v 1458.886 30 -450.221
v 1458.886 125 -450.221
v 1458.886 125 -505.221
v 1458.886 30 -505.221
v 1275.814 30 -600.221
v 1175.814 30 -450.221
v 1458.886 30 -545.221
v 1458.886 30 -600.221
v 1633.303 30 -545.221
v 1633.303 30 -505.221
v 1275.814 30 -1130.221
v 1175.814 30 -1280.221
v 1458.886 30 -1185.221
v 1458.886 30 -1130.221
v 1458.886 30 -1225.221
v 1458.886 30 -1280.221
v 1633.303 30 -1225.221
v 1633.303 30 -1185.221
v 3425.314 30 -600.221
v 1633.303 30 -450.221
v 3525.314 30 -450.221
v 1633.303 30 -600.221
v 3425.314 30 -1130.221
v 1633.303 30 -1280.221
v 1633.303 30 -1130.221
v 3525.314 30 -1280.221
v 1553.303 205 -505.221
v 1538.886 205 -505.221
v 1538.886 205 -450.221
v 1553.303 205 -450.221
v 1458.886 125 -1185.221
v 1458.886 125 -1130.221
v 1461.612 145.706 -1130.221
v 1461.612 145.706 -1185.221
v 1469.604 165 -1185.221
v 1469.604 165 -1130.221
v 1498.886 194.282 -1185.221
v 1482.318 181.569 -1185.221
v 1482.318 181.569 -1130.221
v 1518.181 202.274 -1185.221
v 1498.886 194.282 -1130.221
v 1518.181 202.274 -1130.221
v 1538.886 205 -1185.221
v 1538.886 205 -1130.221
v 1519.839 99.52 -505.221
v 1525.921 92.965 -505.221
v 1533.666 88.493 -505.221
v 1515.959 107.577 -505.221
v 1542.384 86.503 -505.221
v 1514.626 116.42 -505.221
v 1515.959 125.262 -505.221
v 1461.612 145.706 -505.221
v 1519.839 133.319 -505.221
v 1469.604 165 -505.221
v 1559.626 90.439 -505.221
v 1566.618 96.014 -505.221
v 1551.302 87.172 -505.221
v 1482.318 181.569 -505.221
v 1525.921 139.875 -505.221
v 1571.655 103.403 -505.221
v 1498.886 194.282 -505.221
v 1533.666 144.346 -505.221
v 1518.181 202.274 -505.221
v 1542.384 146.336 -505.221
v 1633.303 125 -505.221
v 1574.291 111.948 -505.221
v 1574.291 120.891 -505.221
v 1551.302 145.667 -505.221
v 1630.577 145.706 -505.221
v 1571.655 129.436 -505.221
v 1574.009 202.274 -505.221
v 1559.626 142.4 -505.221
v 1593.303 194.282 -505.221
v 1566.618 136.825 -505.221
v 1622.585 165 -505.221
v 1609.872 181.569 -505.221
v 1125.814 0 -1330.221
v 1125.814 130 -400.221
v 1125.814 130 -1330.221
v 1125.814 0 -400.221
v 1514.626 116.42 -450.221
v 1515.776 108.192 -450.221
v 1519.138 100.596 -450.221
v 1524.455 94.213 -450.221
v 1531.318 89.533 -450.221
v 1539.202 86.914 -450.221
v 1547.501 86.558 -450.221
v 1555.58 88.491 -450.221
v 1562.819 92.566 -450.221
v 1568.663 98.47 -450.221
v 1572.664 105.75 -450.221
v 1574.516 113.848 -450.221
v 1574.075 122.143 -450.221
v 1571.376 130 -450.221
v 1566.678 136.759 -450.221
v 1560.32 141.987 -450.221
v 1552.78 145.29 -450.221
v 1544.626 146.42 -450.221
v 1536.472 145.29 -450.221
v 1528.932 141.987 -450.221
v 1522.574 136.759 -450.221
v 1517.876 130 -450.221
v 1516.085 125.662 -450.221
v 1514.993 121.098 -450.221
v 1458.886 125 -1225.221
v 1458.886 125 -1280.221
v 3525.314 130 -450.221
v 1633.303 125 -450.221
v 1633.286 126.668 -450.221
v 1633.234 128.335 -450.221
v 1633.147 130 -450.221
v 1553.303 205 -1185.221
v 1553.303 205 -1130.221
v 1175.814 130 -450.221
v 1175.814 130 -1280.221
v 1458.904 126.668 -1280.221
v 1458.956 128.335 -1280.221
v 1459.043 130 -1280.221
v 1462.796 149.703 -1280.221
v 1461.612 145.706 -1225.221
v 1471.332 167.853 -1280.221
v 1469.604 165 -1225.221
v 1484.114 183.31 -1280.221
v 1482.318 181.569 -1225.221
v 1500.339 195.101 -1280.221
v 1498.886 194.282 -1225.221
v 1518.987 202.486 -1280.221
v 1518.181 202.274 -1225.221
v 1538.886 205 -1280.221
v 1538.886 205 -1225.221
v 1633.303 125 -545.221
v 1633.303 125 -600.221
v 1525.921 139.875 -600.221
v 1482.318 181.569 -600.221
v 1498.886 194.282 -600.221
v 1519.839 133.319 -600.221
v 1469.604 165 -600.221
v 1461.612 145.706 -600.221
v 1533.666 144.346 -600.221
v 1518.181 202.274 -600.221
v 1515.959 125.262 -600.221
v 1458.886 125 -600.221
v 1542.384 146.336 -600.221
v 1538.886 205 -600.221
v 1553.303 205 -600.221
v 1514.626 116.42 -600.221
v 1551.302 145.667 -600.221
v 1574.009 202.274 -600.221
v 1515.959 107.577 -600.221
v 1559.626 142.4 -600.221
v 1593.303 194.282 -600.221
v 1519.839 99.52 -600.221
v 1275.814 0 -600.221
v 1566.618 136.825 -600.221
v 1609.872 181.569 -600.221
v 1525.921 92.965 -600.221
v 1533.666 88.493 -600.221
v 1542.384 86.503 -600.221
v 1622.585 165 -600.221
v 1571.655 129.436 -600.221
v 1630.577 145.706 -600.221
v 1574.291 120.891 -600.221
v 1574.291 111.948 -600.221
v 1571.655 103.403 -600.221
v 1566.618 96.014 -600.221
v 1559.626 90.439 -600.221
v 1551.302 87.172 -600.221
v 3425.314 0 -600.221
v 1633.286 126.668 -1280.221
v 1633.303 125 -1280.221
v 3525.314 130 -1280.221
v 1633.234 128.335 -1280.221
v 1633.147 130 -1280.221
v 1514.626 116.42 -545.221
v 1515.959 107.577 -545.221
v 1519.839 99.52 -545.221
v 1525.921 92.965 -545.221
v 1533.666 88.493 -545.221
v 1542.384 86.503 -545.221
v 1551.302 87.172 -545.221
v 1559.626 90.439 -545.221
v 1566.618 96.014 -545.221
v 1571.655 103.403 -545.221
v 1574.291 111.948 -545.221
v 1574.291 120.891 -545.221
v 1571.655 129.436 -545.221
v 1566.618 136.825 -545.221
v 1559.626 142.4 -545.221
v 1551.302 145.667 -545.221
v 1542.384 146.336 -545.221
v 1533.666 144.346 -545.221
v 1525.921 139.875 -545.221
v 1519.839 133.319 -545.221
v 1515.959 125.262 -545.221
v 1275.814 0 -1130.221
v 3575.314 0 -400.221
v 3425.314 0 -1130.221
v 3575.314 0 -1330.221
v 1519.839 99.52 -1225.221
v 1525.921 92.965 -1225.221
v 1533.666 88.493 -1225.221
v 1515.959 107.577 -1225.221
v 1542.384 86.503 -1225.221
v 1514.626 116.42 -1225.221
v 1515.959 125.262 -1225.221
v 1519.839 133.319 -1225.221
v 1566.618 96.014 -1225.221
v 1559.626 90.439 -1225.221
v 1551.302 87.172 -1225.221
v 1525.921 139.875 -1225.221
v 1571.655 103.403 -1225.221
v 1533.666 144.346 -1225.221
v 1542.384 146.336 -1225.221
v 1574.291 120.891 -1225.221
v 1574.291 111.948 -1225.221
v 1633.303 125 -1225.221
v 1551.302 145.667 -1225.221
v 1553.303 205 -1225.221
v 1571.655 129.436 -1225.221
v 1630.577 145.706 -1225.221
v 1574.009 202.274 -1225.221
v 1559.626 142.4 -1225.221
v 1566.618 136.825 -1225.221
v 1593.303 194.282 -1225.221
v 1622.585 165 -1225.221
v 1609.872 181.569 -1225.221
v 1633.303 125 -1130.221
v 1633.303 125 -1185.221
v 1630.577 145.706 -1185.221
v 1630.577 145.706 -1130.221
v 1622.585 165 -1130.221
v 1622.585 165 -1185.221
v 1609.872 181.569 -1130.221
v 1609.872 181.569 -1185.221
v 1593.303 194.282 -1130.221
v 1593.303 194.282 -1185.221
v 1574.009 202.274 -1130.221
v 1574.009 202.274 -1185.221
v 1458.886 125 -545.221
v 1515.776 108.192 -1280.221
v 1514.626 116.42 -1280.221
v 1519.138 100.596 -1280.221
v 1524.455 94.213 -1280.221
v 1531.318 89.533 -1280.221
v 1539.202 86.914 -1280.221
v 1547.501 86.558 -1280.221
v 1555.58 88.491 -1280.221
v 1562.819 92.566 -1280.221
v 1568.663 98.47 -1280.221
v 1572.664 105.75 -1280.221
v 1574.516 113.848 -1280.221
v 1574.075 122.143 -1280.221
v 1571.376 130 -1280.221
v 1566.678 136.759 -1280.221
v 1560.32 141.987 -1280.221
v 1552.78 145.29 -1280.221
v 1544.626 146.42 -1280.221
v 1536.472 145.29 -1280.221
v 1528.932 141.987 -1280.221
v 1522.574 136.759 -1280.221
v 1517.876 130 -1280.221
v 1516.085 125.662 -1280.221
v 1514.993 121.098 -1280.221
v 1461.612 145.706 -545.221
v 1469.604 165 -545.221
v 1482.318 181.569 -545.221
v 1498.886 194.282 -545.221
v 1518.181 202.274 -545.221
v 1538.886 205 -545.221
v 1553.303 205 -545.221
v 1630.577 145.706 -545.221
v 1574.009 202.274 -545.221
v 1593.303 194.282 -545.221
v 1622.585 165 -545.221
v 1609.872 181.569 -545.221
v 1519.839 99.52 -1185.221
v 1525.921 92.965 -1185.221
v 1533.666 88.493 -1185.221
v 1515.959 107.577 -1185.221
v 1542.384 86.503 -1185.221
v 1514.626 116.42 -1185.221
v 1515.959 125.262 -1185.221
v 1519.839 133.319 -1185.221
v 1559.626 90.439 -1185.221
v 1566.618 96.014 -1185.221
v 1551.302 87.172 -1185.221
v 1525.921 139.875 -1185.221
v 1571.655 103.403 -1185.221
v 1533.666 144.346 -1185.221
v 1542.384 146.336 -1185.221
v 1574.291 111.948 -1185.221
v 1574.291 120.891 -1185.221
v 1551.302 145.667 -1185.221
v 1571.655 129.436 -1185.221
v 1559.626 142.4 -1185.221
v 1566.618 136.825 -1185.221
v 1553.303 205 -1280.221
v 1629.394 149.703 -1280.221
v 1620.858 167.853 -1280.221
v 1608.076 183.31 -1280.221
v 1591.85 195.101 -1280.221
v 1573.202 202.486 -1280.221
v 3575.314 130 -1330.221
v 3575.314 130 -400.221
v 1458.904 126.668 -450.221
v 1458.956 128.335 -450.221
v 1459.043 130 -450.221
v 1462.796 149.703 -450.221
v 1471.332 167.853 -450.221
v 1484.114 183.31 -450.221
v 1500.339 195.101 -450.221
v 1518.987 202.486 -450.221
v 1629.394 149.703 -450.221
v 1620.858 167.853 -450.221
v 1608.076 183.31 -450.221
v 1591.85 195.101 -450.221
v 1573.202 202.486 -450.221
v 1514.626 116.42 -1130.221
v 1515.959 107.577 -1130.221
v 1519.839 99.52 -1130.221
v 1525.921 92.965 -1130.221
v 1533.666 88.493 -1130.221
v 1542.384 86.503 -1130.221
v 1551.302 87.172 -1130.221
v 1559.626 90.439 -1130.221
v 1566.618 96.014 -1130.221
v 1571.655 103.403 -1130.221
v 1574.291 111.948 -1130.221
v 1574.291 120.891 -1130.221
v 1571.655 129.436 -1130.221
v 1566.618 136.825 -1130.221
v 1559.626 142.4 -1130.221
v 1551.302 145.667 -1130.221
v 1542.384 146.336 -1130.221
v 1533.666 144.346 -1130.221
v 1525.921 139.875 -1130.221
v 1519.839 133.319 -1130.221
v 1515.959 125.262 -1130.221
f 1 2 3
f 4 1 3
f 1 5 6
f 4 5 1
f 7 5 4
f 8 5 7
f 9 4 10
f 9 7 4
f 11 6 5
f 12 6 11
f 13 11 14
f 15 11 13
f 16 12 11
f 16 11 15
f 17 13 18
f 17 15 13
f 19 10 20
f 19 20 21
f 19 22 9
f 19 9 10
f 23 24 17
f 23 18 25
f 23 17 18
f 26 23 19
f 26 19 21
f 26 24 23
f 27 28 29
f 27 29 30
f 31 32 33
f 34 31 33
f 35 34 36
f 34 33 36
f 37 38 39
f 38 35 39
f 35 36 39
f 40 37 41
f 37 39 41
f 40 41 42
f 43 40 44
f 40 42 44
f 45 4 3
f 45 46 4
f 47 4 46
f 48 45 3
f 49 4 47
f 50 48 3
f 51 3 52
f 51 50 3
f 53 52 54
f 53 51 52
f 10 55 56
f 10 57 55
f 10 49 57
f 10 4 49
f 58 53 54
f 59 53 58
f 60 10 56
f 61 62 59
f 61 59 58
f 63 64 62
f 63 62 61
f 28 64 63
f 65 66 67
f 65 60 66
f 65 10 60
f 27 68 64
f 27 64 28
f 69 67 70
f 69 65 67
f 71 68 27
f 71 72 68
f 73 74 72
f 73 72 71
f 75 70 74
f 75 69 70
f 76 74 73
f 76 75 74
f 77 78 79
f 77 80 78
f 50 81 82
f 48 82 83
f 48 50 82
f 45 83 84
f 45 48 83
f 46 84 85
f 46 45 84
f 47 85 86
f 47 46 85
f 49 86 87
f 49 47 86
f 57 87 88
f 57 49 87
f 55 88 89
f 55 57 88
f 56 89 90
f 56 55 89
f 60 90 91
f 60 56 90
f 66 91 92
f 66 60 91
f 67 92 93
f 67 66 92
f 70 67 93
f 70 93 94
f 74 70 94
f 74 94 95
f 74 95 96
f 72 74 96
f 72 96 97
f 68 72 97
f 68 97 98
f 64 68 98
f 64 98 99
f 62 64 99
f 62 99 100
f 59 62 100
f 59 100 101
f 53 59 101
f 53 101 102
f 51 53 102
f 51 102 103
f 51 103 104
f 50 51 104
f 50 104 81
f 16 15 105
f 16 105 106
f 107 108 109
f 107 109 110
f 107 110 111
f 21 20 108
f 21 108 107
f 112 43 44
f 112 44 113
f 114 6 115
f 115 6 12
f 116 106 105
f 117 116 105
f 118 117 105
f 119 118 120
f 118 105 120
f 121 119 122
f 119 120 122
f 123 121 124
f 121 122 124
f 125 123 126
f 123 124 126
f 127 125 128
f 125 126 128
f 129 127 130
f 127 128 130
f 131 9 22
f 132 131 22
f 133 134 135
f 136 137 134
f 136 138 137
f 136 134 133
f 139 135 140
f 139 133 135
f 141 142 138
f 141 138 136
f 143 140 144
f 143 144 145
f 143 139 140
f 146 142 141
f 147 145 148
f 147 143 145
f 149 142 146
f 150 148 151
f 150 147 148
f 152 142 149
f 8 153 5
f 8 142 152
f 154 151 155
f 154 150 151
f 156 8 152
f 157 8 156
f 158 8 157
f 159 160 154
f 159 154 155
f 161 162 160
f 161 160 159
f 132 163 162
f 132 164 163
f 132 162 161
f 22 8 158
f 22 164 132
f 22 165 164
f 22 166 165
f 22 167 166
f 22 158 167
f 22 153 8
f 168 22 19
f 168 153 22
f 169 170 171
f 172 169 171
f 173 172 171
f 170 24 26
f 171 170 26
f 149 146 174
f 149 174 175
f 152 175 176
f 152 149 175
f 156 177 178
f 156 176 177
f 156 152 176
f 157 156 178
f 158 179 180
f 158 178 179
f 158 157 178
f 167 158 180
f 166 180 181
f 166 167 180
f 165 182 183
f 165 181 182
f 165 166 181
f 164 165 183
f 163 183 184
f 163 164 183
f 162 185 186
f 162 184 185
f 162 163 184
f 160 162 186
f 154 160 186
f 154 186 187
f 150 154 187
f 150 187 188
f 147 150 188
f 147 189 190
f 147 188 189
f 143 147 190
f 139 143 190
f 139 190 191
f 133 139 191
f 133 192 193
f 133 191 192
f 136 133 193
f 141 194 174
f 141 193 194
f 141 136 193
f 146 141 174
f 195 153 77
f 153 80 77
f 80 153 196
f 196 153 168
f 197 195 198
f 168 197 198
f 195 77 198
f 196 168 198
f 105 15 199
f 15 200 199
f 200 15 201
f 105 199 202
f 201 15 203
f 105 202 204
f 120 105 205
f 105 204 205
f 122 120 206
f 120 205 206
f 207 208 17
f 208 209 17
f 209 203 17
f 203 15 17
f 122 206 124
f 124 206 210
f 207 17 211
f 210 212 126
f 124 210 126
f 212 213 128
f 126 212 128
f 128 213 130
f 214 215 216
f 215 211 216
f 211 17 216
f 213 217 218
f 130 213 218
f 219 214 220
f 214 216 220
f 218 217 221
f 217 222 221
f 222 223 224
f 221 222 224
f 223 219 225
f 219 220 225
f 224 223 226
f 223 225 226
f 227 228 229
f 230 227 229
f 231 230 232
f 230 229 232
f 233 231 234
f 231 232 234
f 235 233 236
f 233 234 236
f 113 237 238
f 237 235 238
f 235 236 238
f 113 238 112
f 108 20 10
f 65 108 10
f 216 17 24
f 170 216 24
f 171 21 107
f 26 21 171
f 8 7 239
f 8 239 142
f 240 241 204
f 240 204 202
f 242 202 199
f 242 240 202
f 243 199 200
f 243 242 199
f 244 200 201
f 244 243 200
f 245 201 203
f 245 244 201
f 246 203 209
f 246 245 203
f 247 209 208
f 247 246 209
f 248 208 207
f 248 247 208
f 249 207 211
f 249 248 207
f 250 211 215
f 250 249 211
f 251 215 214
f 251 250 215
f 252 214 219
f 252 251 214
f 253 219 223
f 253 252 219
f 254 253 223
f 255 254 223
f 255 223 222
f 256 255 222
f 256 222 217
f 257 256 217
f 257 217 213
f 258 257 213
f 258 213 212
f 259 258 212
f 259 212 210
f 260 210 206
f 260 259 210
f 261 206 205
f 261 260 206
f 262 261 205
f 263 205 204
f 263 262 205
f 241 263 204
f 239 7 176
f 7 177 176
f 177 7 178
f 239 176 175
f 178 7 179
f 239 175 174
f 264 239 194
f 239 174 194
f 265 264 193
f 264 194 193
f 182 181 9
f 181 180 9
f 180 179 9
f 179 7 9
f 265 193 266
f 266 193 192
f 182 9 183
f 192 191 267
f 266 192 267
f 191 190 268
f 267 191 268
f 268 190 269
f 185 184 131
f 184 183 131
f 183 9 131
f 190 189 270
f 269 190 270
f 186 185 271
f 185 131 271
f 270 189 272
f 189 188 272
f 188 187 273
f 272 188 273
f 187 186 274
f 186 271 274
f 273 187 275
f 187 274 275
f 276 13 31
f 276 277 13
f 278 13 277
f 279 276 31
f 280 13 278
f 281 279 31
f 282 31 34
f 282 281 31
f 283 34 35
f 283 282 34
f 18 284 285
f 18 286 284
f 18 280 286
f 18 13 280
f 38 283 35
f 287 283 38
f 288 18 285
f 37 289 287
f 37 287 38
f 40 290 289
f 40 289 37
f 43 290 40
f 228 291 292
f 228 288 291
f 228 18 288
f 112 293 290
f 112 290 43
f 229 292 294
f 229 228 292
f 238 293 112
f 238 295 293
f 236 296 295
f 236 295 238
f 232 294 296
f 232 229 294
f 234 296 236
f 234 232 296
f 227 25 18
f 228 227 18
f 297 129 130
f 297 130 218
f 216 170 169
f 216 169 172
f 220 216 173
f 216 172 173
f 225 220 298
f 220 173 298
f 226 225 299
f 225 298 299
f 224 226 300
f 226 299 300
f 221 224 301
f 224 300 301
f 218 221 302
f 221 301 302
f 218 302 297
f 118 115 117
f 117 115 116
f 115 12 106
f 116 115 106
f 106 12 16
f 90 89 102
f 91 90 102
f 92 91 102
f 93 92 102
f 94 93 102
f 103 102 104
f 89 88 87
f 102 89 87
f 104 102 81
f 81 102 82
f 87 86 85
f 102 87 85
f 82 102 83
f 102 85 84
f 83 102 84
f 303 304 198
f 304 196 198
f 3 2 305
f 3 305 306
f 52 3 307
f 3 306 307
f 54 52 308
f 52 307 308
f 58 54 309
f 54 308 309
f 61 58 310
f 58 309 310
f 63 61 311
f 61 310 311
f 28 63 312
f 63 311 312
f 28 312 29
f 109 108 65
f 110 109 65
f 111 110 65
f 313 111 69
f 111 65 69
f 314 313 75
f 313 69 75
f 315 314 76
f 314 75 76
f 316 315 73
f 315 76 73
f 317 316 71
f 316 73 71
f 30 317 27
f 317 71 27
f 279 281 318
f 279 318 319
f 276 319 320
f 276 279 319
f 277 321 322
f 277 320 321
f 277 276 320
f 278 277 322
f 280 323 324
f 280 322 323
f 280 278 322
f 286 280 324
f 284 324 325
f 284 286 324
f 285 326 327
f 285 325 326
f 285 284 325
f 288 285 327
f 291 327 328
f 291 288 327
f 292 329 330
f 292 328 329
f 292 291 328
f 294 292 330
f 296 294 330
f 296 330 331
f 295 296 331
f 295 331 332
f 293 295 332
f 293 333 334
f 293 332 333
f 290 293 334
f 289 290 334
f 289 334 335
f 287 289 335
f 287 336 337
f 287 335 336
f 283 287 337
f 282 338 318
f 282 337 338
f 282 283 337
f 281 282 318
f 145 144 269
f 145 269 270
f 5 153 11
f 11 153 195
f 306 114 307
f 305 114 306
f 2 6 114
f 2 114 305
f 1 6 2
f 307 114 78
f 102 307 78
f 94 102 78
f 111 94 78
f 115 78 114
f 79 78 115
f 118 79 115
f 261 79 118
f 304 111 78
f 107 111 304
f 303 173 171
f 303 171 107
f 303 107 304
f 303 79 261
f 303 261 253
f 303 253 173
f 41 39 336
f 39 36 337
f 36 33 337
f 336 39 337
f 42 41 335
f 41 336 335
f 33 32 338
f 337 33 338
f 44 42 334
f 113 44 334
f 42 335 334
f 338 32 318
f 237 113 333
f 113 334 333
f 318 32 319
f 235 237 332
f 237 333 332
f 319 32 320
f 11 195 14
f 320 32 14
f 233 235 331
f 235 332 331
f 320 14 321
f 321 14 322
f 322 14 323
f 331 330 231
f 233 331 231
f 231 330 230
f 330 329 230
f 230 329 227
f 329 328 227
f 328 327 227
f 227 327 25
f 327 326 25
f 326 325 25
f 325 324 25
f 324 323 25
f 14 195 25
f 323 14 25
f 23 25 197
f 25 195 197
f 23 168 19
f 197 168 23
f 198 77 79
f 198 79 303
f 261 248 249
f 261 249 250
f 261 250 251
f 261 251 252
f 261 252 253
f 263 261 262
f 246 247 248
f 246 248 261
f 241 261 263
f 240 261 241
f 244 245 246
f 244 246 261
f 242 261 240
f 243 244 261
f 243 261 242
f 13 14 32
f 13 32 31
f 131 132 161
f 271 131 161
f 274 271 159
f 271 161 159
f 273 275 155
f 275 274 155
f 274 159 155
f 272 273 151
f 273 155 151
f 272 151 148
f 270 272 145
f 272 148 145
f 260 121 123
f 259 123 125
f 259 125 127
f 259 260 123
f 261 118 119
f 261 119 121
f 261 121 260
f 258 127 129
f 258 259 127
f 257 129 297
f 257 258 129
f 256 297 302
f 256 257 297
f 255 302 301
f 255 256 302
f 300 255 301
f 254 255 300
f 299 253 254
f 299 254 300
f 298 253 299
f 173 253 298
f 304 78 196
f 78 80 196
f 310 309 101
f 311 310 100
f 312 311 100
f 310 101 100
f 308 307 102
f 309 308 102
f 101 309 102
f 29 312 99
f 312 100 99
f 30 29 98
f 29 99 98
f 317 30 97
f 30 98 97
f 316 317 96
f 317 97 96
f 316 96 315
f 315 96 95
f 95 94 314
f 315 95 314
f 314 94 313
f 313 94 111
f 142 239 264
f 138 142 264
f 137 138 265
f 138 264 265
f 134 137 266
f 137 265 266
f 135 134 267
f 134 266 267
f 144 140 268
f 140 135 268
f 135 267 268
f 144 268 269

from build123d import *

# Parameters (mm, degrees)
SKETCH4_W               = 2449.5
SKETCH4_H               = 930
SKETCH4_W_2             = 2149.5
SKETCH4_H_2             = 530
BOSS_EXTRUDE2_DEPTH     = 30
SKETCH6_W               = 2449.5
SKETCH6_H               = 930
SKETCH6_W_2             = 2349.5
SKETCH6_H_2             = 830
BOSS_EXTRUDE3_DEPTH     = 100
SKETCH8_W               = 174.417097876
SKETCH8_H               = 150
BOSS_EXTRUDE4_DEPTH     = 175
CUT_EXTRUDE1_DEPTH      = 680
CUT_EXTRUDE1_DEPTH_BACK = 150
SKETCH10_R              = 30
FILLET1_R               = 80
SKETCH12_W              = 40
SKETCH12_H              = 200
CUT_EXTRUDE2_DEPTH      = 184


with BuildPart() as part:
    # Sketch4 → Boss-Extrude2 (new body)
    with BuildSketch(Plane(origin=(0, 0, 0), x_dir=(1, 0, 0), z_dir=(0, 1, 0))):
        with Locations((2350.564429087, 865.22075714)):
            Rectangle(SKETCH4_W, SKETCH4_H)
        with Locations((2350.564429087, 865.22075714)):
            Rectangle(SKETCH4_W_2, SKETCH4_H_2, mode=Mode.SUBTRACT)
    extrude(amount=BOSS_EXTRUDE2_DEPTH)

    # Sketch6 → Boss-Extrude3 (add)
    with BuildSketch(Plane(origin=(0, 30, 0), x_dir=(1, 0, 0), z_dir=(0, 1, 0))):
        with Locations((2350.564429087, 865.22075714)):
            Rectangle(SKETCH6_W, SKETCH6_H)
        with Locations((2350.564429087, 865.22075714)):
            Rectangle(SKETCH6_W_2, SKETCH6_H_2, mode=Mode.SUBTRACT)
    extrude(amount=BOSS_EXTRUDE3_DEPTH)

    # Sketch8 → Boss-Extrude4 (add)
    with BuildSketch(Plane(origin=(0, 30, 0), x_dir=(1, 0, 0), z_dir=(0, 1, 0))):
        with Locations((1546.094821657, 1205.22075714)):
            Rectangle(SKETCH8_W, SKETCH8_H)
        with Locations((1546.094821657, 525.22075714)):
            Rectangle(SKETCH8_W, SKETCH8_H)
    extrude(amount=BOSS_EXTRUDE4_DEPTH)

    # Sketch10 → Cut-Extrude1 (cut, two sides: drawn at the far end of the back side and taken through both)
    with BuildSketch(Plane.XY.offset(-1130.22075714).offset(-CUT_EXTRUDE1_DEPTH_BACK)):
        with Locations(Location((1544.625999864, 116.419579706, 0), (0, 0, 180))):
            Circle(SKETCH10_R)
    extrude(amount=CUT_EXTRUDE1_DEPTH + CUT_EXTRUDE1_DEPTH_BACK, mode=Mode.SUBTRACT)

    # Fillet1
    # the kernel refuses this fillet: 80 mm, written as the material it takes off along each edge
    with BuildSketch(Plane(origin=(1633.303370595, 205, -1280.22075714), x_dir=(0, -1, 0), z_dir=(0, 0, 1)), Plane(origin=(1458.886272719, 205, -450.22075714), x_dir=(0, -1, 0), z_dir=(0, 0, -1))) as fillet1_piece_1:
        with BuildLine():
            CenterArc((FILLET1_R, -FILLET1_R), FILLET1_R, 90, 90)
            Line((0, -FILLET1_R), (0, 0))
            Line((0, 0), (FILLET1_R, 0))
        make_face()
    extrude(amount=350, mode=Mode.SUBTRACT)
    with BuildSketch(Plane(origin=(1458.886272719, 205, -930.22075714), x_dir=(1, 0, 0), z_dir=(0, 0, -1)), Plane(origin=(1633.303370595, 205, -800.22075714), x_dir=(-1, 0, 0), z_dir=(0, 0, 1))) as fillet1_piece_2:
        with BuildLine():
            CenterArc((FILLET1_R, FILLET1_R), FILLET1_R, 180, 90)
            Line((0, FILLET1_R), (0, 0))
            Line((0, 0), (FILLET1_R, 0))
        make_face()
    extrude(amount=350, mode=Mode.SUBTRACT)

    # Sketch12 → Cut-Extrude2 (cut)
    with BuildSketch(Plane(origin=(1633.303370595, 0, 0), x_dir=(0, 0, -1), z_dir=(1, 0, 0))):
        with Locations((1205.22075714, 130)):
            Rectangle(SKETCH12_W, SKETCH12_H)
        with Locations((525.22075714, 130)):
            Rectangle(SKETCH12_W, SKETCH12_H)
    extrude(amount=-CUT_EXTRUDE2_DEPTH, mode=Mode.SUBTRACT)


solid = part.part
